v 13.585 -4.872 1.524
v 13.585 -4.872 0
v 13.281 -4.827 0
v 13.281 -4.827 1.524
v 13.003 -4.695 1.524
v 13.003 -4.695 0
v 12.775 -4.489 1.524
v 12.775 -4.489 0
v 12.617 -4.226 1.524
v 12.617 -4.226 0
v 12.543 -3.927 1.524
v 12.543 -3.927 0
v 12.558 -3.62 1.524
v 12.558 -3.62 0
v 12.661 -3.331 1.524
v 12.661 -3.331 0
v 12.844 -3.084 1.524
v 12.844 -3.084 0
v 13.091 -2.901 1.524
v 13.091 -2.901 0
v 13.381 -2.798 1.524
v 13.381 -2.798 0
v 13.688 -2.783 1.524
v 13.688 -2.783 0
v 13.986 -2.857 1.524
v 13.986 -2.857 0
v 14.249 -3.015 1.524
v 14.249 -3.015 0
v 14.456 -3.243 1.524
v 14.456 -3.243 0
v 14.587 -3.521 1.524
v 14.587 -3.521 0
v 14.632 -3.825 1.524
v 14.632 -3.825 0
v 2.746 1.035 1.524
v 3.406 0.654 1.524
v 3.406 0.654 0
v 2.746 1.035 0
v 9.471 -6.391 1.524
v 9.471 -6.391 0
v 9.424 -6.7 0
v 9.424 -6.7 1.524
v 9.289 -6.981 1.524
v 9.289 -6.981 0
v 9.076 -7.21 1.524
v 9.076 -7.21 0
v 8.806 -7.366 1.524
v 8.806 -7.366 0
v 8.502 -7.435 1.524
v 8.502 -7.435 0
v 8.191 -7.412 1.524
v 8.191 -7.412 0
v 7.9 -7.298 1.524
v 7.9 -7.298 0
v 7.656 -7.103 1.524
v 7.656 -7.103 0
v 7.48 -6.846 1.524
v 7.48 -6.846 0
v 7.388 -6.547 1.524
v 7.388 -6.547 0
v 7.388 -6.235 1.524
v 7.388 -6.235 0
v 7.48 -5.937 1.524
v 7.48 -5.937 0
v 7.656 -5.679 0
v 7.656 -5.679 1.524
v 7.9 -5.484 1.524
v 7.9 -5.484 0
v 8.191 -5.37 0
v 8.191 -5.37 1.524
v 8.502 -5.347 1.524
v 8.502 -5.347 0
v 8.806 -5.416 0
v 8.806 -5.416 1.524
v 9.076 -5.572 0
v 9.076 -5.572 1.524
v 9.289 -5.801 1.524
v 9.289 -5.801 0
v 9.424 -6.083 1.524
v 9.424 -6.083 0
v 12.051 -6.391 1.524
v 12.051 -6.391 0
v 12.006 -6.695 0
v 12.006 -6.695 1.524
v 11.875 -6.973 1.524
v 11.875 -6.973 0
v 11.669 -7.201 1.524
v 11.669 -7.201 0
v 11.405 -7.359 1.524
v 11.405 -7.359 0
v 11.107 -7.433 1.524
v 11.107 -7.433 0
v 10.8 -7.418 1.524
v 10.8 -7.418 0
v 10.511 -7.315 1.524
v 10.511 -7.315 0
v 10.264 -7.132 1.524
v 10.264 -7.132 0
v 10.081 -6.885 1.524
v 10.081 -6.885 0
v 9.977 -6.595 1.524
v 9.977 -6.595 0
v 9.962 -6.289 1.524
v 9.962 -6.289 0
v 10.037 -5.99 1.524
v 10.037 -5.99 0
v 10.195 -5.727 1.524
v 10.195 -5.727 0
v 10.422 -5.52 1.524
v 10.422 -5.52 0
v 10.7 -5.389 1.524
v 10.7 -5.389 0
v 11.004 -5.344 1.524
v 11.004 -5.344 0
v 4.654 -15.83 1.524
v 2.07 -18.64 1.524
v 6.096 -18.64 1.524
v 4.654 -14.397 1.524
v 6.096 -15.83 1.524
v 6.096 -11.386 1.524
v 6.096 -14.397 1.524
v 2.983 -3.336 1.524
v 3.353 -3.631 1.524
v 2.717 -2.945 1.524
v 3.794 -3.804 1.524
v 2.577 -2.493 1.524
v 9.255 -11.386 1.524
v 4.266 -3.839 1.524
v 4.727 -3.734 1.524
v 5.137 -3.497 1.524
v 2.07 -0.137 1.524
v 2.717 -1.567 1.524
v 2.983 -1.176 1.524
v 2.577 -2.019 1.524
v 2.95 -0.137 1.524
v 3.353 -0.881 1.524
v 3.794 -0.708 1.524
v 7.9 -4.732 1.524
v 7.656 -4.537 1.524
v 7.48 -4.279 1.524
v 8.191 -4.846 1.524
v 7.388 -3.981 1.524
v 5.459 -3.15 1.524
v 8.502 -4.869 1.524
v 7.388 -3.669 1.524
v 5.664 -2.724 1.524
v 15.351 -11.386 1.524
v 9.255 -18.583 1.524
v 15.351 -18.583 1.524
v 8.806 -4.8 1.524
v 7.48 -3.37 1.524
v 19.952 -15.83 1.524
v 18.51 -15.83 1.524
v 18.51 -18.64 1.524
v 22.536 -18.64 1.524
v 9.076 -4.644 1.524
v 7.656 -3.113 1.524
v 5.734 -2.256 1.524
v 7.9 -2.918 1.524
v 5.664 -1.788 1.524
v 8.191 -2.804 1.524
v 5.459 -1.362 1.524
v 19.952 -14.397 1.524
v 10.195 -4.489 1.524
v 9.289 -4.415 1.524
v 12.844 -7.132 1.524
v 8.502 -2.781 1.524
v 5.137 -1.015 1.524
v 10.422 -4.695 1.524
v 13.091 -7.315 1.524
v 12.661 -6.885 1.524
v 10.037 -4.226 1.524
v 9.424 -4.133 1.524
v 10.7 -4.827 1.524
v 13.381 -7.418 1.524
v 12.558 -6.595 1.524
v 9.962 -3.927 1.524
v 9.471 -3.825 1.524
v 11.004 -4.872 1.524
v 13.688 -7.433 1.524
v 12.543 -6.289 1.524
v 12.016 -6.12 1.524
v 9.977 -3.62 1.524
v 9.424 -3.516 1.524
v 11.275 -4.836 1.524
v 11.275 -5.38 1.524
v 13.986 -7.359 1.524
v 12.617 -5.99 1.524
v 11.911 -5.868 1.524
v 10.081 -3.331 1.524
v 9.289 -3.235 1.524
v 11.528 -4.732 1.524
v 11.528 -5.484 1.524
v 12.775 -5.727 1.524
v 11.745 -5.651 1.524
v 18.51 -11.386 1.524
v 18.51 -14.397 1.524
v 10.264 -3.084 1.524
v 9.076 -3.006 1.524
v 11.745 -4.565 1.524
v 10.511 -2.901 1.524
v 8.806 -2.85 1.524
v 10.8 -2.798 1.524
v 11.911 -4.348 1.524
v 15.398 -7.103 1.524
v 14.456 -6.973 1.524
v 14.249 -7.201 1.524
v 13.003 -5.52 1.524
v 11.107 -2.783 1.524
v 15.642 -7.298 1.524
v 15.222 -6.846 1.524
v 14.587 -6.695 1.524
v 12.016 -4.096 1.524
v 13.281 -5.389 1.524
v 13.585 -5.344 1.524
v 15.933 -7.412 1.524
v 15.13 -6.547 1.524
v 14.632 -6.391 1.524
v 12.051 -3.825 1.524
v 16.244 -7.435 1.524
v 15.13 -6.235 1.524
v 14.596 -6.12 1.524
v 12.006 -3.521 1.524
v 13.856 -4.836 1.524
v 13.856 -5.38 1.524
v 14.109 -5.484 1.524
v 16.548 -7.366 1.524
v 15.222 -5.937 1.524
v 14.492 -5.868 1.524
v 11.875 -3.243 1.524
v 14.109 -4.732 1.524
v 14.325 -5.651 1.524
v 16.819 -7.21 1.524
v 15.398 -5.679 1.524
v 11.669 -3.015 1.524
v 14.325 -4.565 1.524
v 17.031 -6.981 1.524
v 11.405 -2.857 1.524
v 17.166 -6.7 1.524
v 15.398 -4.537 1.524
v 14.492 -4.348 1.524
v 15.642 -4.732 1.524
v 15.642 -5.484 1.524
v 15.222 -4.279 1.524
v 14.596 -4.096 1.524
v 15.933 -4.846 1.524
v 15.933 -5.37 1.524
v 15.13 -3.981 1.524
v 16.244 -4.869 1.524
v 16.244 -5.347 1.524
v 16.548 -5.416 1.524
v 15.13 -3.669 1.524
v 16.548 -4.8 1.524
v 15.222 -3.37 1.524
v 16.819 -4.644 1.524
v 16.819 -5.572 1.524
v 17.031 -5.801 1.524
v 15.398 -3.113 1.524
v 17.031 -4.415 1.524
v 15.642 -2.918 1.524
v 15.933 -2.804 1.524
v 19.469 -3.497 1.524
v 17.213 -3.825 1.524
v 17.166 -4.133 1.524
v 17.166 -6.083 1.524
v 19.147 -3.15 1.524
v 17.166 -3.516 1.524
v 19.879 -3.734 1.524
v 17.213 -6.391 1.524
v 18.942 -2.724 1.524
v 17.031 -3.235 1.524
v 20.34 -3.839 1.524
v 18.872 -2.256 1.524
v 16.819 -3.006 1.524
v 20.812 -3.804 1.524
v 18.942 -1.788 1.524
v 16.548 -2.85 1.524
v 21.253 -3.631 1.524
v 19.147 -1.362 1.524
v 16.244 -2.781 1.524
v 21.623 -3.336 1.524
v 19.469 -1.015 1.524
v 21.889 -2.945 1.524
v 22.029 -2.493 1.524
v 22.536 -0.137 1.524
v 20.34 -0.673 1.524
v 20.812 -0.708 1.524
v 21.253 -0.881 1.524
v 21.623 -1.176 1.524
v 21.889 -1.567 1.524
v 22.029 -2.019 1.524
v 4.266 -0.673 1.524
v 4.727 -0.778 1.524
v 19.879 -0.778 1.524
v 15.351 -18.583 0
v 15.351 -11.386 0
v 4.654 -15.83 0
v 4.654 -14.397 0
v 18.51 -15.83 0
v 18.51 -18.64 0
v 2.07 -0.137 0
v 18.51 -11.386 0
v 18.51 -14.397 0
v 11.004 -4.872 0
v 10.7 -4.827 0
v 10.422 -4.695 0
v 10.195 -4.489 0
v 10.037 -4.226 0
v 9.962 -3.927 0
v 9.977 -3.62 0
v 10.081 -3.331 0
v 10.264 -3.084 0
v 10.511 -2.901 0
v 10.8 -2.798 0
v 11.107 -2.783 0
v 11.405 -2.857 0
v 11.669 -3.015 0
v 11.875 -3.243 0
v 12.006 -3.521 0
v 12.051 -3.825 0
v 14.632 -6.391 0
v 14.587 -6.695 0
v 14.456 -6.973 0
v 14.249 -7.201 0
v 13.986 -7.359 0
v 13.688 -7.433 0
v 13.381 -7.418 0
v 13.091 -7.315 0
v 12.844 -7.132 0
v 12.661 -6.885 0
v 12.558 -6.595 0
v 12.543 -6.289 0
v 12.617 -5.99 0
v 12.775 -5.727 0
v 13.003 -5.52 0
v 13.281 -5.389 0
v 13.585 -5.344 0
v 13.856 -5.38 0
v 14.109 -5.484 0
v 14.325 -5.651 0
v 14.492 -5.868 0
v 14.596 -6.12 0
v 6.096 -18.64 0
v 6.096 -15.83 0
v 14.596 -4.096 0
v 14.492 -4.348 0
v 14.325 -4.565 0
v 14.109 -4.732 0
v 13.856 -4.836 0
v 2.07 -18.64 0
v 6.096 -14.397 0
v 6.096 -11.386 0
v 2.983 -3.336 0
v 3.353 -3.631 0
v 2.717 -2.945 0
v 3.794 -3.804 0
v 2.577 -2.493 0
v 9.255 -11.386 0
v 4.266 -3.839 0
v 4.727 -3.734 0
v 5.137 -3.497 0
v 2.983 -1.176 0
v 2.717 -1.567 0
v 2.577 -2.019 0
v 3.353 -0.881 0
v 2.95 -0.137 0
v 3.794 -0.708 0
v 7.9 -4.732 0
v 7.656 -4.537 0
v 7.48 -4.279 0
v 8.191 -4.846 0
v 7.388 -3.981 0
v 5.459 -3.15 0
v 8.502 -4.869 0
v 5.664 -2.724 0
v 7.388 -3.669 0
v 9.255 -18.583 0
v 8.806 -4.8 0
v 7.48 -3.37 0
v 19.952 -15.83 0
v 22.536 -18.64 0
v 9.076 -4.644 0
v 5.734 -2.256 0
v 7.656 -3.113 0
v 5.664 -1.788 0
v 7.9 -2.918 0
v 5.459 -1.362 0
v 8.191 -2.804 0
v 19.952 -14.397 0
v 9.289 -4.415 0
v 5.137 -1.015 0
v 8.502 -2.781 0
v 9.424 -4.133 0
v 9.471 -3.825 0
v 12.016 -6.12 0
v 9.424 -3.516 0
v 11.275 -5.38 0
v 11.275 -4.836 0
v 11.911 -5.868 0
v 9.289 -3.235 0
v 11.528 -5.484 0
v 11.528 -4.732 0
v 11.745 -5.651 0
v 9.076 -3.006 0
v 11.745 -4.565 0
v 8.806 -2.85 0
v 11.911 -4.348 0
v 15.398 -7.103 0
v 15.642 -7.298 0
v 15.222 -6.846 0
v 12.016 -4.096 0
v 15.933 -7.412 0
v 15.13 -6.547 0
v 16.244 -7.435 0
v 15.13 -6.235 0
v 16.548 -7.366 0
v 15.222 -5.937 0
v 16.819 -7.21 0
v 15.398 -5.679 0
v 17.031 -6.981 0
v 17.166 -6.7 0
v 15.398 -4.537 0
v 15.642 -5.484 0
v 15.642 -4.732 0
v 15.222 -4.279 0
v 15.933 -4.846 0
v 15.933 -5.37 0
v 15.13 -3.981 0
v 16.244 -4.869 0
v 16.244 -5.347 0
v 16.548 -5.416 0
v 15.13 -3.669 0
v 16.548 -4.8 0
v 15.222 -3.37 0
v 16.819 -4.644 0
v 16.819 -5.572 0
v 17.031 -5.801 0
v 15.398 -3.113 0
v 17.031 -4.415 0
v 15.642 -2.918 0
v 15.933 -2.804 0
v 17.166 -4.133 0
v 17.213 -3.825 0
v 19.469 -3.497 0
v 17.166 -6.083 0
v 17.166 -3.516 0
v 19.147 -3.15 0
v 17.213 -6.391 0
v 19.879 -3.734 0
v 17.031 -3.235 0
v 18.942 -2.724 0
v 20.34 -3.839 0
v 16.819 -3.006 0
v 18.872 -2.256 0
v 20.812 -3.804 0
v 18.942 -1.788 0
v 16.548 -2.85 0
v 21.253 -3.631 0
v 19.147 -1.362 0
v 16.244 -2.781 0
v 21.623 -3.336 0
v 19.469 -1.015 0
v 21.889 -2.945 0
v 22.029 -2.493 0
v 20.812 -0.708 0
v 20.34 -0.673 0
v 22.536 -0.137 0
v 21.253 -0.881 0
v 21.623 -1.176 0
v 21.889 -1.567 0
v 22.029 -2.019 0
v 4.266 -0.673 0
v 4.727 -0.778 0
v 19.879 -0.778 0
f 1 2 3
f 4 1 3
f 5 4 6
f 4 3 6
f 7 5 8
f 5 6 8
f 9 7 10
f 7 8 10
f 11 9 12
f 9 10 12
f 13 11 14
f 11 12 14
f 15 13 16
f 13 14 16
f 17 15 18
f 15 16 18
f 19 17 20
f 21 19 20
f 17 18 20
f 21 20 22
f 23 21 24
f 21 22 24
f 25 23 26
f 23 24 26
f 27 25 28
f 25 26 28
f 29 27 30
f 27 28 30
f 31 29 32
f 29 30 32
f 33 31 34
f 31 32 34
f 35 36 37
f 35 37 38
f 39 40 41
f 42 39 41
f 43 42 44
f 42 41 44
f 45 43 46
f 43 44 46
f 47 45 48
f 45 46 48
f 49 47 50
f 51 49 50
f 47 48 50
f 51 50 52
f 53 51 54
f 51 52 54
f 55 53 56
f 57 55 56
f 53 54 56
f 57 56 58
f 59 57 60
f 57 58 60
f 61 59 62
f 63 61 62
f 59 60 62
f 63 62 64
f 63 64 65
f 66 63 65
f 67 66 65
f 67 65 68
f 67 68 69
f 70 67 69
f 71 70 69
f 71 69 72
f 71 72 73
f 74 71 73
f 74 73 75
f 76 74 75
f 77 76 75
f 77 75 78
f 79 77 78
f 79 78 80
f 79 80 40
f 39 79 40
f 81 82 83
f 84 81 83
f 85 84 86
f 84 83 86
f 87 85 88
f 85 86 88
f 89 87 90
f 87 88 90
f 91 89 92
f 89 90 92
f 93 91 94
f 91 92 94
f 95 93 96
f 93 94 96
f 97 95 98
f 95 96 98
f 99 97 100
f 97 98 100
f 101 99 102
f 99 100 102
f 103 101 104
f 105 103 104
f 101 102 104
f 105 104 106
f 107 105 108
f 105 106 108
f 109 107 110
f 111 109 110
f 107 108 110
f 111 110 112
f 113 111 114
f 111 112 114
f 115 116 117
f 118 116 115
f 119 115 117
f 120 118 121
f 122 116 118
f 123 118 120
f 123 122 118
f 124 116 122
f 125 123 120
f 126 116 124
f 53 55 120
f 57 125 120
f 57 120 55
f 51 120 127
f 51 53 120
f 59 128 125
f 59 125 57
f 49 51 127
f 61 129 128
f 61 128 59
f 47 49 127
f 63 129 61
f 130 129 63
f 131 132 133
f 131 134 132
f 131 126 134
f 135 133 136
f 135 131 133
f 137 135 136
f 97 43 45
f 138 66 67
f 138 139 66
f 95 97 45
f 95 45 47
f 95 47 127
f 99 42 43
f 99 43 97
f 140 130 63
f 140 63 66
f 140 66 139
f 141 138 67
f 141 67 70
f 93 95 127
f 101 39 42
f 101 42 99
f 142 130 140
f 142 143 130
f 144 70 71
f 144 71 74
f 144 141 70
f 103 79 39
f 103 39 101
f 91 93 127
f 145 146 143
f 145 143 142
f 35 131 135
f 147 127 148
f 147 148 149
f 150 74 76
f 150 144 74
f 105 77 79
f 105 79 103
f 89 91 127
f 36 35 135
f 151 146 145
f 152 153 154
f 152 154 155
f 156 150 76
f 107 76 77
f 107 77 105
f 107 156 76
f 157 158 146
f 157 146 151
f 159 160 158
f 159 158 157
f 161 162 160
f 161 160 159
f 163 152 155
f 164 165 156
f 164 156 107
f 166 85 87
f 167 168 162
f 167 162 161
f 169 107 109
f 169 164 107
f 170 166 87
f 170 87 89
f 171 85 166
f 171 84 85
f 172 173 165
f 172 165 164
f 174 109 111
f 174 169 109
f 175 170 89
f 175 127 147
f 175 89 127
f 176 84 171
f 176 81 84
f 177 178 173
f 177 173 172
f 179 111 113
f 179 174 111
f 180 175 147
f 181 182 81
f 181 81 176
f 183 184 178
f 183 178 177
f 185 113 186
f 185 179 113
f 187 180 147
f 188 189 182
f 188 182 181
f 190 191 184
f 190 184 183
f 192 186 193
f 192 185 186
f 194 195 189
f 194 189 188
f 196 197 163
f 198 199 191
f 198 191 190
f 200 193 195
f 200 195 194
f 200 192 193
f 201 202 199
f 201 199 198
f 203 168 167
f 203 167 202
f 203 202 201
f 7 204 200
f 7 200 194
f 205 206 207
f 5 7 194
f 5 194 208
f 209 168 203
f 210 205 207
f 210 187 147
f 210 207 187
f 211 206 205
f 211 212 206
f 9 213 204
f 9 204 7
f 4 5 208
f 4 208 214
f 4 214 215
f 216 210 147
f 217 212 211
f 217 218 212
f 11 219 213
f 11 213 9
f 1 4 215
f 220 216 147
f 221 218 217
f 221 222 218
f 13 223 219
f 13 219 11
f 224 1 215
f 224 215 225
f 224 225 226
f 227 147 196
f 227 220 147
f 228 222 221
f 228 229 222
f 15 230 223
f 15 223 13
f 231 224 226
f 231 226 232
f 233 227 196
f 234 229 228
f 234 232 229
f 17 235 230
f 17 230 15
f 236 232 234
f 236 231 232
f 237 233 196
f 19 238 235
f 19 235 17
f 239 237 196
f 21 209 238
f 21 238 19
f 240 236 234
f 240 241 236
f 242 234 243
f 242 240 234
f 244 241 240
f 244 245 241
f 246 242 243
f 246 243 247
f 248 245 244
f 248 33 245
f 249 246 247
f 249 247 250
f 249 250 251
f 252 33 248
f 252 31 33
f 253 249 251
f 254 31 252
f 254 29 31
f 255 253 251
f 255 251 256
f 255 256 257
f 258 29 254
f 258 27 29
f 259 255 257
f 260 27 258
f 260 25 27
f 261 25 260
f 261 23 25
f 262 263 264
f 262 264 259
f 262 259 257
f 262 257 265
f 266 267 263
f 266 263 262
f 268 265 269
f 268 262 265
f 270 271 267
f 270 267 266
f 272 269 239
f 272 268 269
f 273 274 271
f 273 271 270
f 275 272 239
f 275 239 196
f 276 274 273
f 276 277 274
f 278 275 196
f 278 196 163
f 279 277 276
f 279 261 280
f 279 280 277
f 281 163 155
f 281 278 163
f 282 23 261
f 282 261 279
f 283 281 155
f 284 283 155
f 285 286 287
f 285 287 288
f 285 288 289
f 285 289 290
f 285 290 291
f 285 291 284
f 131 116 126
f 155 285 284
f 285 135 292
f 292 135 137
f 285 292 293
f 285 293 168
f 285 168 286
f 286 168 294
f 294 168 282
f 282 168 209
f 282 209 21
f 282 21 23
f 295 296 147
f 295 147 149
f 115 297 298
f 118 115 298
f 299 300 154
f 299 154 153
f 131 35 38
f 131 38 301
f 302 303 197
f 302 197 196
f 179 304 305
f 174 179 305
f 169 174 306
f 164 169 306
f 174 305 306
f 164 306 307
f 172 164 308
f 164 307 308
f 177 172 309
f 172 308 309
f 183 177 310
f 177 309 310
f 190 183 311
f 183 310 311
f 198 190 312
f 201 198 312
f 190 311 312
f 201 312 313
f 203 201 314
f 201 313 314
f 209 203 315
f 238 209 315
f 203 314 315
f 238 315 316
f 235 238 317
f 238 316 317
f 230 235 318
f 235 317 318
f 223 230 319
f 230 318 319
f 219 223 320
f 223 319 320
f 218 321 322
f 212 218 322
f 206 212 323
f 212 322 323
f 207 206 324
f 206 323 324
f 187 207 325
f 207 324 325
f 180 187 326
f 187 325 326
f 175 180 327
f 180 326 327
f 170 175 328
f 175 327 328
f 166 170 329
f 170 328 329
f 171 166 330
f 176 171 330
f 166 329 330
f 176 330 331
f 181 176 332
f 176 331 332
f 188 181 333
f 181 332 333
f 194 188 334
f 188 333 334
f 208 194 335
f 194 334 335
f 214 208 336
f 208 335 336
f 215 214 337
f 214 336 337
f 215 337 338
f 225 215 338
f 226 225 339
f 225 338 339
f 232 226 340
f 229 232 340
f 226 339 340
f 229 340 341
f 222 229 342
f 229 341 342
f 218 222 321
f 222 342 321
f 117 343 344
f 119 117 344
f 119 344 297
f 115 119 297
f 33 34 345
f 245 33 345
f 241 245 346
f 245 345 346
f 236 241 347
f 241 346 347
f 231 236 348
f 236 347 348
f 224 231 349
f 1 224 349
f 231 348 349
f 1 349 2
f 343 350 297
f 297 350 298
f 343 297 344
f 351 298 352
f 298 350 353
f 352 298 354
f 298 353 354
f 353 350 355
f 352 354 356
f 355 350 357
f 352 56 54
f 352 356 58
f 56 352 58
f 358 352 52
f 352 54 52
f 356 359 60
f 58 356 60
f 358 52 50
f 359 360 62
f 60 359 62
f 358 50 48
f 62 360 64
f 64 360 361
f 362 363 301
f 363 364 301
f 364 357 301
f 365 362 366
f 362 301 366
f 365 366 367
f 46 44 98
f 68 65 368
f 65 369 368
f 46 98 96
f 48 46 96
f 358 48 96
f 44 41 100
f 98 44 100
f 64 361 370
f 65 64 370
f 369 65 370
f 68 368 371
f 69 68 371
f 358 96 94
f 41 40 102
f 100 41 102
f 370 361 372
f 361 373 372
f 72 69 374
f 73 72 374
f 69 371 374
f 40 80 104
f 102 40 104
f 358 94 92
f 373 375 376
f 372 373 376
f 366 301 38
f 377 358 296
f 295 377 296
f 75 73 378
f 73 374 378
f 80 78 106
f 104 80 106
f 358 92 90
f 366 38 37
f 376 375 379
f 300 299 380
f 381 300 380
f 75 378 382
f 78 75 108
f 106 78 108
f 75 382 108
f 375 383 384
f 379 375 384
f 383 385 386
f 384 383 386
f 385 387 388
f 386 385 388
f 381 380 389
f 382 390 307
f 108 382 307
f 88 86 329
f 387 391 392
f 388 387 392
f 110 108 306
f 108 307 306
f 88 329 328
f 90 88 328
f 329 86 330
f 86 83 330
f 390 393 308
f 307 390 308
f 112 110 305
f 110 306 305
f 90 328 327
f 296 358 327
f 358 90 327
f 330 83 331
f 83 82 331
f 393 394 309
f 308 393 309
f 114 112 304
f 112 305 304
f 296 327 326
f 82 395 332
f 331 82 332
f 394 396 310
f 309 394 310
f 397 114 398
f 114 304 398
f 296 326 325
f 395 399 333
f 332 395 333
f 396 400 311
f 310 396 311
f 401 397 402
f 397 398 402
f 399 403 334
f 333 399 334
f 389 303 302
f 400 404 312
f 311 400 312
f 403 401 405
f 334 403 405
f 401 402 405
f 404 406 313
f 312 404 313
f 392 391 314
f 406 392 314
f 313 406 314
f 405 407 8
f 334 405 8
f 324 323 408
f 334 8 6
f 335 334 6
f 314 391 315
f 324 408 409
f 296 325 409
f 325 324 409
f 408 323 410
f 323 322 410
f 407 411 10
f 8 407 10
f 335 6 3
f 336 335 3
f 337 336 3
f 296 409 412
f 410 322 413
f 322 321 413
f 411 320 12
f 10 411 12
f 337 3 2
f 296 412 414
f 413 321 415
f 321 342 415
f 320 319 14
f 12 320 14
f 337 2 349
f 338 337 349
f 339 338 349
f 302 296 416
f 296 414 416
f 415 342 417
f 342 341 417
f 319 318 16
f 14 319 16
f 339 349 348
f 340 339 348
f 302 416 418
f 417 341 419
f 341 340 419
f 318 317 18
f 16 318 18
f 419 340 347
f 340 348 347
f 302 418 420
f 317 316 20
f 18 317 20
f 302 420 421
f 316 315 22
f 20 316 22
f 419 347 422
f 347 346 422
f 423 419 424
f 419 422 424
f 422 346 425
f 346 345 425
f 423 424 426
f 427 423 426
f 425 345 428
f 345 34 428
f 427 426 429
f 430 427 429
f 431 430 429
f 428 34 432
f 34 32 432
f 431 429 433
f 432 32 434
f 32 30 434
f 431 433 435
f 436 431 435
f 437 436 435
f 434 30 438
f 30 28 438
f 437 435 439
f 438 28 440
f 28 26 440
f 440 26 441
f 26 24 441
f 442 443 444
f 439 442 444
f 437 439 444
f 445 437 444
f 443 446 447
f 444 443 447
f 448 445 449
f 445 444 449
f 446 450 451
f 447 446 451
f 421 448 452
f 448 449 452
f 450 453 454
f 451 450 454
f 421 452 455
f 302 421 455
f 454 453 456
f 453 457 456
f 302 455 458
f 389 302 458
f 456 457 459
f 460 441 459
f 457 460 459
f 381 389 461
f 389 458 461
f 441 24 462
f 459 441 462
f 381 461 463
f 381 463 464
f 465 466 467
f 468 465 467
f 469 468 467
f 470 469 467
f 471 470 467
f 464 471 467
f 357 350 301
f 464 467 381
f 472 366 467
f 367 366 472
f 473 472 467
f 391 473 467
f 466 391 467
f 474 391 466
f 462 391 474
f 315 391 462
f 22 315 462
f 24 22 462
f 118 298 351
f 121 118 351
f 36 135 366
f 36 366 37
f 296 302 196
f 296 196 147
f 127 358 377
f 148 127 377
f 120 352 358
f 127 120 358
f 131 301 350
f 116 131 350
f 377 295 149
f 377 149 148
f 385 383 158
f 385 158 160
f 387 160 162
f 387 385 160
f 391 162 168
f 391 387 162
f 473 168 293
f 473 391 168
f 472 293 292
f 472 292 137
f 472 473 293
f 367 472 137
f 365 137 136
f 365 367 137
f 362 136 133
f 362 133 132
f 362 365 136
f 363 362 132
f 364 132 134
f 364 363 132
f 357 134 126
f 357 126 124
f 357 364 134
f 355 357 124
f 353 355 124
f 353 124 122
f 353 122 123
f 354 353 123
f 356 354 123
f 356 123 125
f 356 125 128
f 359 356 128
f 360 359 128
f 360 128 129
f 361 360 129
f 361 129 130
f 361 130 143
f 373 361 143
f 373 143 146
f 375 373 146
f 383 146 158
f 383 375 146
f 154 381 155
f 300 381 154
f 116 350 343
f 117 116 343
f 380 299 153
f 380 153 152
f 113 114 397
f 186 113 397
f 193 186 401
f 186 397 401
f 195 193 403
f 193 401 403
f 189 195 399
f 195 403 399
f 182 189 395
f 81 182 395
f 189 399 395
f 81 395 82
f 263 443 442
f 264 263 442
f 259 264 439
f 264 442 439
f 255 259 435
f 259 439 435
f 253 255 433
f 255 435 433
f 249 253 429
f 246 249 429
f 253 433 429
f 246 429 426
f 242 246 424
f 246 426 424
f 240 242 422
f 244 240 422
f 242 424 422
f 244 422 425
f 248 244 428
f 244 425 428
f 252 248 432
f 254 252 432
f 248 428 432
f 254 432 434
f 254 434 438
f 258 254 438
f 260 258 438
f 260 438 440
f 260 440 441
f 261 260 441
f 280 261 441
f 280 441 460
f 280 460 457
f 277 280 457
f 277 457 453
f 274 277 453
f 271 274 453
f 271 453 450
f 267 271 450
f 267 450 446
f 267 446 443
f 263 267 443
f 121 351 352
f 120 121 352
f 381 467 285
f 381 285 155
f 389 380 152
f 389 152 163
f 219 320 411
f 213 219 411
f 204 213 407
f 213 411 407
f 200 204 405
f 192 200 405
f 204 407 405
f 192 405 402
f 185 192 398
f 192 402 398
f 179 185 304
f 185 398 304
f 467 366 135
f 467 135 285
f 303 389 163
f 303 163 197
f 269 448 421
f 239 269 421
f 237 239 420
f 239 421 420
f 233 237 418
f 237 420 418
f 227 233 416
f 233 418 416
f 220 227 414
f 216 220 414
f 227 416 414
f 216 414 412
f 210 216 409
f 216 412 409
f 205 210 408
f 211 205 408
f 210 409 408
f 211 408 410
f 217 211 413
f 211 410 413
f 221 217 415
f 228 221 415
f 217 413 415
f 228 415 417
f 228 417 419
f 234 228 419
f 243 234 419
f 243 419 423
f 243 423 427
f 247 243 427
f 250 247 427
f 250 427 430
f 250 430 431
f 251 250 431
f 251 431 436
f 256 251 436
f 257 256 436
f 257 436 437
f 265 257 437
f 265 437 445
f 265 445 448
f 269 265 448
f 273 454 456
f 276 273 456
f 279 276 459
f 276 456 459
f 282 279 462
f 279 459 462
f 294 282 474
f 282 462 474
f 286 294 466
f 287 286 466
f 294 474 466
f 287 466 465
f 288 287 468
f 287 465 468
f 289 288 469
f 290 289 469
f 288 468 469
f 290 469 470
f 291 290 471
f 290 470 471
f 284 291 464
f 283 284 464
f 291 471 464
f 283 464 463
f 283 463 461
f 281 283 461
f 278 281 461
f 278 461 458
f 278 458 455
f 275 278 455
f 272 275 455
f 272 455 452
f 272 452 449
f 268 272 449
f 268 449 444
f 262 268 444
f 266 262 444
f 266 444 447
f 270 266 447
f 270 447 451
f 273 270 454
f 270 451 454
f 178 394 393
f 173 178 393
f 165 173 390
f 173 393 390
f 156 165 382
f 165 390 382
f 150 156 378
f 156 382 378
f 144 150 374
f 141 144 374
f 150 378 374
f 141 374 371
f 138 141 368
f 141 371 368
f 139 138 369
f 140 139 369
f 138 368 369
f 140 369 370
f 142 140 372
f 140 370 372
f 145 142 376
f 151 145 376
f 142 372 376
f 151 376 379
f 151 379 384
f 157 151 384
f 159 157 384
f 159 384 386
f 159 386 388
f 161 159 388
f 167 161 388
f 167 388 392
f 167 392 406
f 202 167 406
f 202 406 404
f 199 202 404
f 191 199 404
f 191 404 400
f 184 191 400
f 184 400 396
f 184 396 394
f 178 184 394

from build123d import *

# Parameters (mm, degrees)
F0_R     = 1.5875
F1_DEPTH = 1.524
F3_R     = 1.0471954036
F4_DEPTH = 1.525
F7_DEPTH = 1.524


with BuildPart() as f1:
    # F0 (on Top) → F1 (new body)
    with BuildSketch(Plane.XY):
        Polygon((12.3030065617, -0.1368533121), (2.0698180888, -0.1368533121), (2.0698180888, -18.6402630061), (6.0960869305, -18.6402630061), (6.0960869305, -15.829924494), (4.6535655856, -15.829924494), (4.6535655856, -14.3967131153), (6.0960869305, -14.3967131153), (6.0960869305, -11.3862287253), (9.2548192479, -11.3862287253), (9.2548192479, -18.5830555856), (12.3030065617, -18.5830555856), align=None)
        with Locations((4.1468967684, -2.2560383659)):
            Circle(F0_R, mode=Mode.SUBTRACT)
    extrude(amount=F1_DEPTH)

    # F2: F1 across face


with BuildPart() as f1_1:
    add(f1.part)
    add(f1.part.mirror(Plane(origin=(12.3030065617, -9.3599544489, 0.762), x_dir=(0, 1, 0), z_dir=(1, 0, 0))))

    # F3 (on face) → F4 (cut, through all)
    with BuildSketch(Plane(origin=(0, 0, 0), x_dir=(1, 0, 0), z_dir=(0, 0, -1))):
        with Locations((16.1656420678, 3.8247841876)):
            Circle(F3_R)
        with BuildLine():
            ThreePointArc((13.5849428674, 4.8719795912), (12.8444638963, 3.0843052165), (14.6321382709, 3.8247841876))
            ThreePointArc((14.6321382709, 3.8247841876), (14.3254218385, 4.5652631587), (13.5849428674, 4.8719795912))
        make_face()
        with BuildLine():
            ThreePointArc((14.6321382709, 6.3911853358), (12.8444638963, 7.1316643069), (13.5849428674, 5.3439899322))
            ThreePointArc((13.5849428674, 5.3439899322), (14.3254218385, 5.6507063647), (14.6321382709, 6.3911853358))
        make_face()
        with Locations((8.4235444665, 3.8247841876)):
            Circle(F3_R)
        with Locations((8.4235444665, 6.3911853358)):
            Circle(F3_R)
        with Locations((16.1656420678, 6.3911853358)):
            Circle(F3_R)
        with BuildLine():
            ThreePointArc((11.0042436669, 4.8719795912), (10.2637646958, 3.0843052165), (12.0514390705, 3.8247841876))
            ThreePointArc((12.0514390705, 3.8247841876), (11.744722638, 4.5652631587), (11.0042436669, 4.8719795912))
        make_face()
        with BuildLine():
            ThreePointArc((12.0514390705, 6.3911853358), (10.2637646958, 7.1316643069), (11.0042436669, 5.3439899322))
            ThreePointArc((11.0042436669, 5.3439899322), (11.744722638, 5.6507063647), (12.0514390705, 6.3911853358))
        make_face()
    extrude(amount=-F4_DEPTH, mode=Mode.SUBTRACT)

    # F6 (on face) → F7 (join, through all)
    with BuildSketch(Plane.XY.offset(1.524)):
        Polygon((2.7463897519, 1.0350031834), (2.0698180888, -0.1368533121), (2.949699899, -0.1368533121), (3.4063011096, 0.6540031834), align=None)
    extrude(amount=-F7_DEPTH)


solid = f1_1.part
